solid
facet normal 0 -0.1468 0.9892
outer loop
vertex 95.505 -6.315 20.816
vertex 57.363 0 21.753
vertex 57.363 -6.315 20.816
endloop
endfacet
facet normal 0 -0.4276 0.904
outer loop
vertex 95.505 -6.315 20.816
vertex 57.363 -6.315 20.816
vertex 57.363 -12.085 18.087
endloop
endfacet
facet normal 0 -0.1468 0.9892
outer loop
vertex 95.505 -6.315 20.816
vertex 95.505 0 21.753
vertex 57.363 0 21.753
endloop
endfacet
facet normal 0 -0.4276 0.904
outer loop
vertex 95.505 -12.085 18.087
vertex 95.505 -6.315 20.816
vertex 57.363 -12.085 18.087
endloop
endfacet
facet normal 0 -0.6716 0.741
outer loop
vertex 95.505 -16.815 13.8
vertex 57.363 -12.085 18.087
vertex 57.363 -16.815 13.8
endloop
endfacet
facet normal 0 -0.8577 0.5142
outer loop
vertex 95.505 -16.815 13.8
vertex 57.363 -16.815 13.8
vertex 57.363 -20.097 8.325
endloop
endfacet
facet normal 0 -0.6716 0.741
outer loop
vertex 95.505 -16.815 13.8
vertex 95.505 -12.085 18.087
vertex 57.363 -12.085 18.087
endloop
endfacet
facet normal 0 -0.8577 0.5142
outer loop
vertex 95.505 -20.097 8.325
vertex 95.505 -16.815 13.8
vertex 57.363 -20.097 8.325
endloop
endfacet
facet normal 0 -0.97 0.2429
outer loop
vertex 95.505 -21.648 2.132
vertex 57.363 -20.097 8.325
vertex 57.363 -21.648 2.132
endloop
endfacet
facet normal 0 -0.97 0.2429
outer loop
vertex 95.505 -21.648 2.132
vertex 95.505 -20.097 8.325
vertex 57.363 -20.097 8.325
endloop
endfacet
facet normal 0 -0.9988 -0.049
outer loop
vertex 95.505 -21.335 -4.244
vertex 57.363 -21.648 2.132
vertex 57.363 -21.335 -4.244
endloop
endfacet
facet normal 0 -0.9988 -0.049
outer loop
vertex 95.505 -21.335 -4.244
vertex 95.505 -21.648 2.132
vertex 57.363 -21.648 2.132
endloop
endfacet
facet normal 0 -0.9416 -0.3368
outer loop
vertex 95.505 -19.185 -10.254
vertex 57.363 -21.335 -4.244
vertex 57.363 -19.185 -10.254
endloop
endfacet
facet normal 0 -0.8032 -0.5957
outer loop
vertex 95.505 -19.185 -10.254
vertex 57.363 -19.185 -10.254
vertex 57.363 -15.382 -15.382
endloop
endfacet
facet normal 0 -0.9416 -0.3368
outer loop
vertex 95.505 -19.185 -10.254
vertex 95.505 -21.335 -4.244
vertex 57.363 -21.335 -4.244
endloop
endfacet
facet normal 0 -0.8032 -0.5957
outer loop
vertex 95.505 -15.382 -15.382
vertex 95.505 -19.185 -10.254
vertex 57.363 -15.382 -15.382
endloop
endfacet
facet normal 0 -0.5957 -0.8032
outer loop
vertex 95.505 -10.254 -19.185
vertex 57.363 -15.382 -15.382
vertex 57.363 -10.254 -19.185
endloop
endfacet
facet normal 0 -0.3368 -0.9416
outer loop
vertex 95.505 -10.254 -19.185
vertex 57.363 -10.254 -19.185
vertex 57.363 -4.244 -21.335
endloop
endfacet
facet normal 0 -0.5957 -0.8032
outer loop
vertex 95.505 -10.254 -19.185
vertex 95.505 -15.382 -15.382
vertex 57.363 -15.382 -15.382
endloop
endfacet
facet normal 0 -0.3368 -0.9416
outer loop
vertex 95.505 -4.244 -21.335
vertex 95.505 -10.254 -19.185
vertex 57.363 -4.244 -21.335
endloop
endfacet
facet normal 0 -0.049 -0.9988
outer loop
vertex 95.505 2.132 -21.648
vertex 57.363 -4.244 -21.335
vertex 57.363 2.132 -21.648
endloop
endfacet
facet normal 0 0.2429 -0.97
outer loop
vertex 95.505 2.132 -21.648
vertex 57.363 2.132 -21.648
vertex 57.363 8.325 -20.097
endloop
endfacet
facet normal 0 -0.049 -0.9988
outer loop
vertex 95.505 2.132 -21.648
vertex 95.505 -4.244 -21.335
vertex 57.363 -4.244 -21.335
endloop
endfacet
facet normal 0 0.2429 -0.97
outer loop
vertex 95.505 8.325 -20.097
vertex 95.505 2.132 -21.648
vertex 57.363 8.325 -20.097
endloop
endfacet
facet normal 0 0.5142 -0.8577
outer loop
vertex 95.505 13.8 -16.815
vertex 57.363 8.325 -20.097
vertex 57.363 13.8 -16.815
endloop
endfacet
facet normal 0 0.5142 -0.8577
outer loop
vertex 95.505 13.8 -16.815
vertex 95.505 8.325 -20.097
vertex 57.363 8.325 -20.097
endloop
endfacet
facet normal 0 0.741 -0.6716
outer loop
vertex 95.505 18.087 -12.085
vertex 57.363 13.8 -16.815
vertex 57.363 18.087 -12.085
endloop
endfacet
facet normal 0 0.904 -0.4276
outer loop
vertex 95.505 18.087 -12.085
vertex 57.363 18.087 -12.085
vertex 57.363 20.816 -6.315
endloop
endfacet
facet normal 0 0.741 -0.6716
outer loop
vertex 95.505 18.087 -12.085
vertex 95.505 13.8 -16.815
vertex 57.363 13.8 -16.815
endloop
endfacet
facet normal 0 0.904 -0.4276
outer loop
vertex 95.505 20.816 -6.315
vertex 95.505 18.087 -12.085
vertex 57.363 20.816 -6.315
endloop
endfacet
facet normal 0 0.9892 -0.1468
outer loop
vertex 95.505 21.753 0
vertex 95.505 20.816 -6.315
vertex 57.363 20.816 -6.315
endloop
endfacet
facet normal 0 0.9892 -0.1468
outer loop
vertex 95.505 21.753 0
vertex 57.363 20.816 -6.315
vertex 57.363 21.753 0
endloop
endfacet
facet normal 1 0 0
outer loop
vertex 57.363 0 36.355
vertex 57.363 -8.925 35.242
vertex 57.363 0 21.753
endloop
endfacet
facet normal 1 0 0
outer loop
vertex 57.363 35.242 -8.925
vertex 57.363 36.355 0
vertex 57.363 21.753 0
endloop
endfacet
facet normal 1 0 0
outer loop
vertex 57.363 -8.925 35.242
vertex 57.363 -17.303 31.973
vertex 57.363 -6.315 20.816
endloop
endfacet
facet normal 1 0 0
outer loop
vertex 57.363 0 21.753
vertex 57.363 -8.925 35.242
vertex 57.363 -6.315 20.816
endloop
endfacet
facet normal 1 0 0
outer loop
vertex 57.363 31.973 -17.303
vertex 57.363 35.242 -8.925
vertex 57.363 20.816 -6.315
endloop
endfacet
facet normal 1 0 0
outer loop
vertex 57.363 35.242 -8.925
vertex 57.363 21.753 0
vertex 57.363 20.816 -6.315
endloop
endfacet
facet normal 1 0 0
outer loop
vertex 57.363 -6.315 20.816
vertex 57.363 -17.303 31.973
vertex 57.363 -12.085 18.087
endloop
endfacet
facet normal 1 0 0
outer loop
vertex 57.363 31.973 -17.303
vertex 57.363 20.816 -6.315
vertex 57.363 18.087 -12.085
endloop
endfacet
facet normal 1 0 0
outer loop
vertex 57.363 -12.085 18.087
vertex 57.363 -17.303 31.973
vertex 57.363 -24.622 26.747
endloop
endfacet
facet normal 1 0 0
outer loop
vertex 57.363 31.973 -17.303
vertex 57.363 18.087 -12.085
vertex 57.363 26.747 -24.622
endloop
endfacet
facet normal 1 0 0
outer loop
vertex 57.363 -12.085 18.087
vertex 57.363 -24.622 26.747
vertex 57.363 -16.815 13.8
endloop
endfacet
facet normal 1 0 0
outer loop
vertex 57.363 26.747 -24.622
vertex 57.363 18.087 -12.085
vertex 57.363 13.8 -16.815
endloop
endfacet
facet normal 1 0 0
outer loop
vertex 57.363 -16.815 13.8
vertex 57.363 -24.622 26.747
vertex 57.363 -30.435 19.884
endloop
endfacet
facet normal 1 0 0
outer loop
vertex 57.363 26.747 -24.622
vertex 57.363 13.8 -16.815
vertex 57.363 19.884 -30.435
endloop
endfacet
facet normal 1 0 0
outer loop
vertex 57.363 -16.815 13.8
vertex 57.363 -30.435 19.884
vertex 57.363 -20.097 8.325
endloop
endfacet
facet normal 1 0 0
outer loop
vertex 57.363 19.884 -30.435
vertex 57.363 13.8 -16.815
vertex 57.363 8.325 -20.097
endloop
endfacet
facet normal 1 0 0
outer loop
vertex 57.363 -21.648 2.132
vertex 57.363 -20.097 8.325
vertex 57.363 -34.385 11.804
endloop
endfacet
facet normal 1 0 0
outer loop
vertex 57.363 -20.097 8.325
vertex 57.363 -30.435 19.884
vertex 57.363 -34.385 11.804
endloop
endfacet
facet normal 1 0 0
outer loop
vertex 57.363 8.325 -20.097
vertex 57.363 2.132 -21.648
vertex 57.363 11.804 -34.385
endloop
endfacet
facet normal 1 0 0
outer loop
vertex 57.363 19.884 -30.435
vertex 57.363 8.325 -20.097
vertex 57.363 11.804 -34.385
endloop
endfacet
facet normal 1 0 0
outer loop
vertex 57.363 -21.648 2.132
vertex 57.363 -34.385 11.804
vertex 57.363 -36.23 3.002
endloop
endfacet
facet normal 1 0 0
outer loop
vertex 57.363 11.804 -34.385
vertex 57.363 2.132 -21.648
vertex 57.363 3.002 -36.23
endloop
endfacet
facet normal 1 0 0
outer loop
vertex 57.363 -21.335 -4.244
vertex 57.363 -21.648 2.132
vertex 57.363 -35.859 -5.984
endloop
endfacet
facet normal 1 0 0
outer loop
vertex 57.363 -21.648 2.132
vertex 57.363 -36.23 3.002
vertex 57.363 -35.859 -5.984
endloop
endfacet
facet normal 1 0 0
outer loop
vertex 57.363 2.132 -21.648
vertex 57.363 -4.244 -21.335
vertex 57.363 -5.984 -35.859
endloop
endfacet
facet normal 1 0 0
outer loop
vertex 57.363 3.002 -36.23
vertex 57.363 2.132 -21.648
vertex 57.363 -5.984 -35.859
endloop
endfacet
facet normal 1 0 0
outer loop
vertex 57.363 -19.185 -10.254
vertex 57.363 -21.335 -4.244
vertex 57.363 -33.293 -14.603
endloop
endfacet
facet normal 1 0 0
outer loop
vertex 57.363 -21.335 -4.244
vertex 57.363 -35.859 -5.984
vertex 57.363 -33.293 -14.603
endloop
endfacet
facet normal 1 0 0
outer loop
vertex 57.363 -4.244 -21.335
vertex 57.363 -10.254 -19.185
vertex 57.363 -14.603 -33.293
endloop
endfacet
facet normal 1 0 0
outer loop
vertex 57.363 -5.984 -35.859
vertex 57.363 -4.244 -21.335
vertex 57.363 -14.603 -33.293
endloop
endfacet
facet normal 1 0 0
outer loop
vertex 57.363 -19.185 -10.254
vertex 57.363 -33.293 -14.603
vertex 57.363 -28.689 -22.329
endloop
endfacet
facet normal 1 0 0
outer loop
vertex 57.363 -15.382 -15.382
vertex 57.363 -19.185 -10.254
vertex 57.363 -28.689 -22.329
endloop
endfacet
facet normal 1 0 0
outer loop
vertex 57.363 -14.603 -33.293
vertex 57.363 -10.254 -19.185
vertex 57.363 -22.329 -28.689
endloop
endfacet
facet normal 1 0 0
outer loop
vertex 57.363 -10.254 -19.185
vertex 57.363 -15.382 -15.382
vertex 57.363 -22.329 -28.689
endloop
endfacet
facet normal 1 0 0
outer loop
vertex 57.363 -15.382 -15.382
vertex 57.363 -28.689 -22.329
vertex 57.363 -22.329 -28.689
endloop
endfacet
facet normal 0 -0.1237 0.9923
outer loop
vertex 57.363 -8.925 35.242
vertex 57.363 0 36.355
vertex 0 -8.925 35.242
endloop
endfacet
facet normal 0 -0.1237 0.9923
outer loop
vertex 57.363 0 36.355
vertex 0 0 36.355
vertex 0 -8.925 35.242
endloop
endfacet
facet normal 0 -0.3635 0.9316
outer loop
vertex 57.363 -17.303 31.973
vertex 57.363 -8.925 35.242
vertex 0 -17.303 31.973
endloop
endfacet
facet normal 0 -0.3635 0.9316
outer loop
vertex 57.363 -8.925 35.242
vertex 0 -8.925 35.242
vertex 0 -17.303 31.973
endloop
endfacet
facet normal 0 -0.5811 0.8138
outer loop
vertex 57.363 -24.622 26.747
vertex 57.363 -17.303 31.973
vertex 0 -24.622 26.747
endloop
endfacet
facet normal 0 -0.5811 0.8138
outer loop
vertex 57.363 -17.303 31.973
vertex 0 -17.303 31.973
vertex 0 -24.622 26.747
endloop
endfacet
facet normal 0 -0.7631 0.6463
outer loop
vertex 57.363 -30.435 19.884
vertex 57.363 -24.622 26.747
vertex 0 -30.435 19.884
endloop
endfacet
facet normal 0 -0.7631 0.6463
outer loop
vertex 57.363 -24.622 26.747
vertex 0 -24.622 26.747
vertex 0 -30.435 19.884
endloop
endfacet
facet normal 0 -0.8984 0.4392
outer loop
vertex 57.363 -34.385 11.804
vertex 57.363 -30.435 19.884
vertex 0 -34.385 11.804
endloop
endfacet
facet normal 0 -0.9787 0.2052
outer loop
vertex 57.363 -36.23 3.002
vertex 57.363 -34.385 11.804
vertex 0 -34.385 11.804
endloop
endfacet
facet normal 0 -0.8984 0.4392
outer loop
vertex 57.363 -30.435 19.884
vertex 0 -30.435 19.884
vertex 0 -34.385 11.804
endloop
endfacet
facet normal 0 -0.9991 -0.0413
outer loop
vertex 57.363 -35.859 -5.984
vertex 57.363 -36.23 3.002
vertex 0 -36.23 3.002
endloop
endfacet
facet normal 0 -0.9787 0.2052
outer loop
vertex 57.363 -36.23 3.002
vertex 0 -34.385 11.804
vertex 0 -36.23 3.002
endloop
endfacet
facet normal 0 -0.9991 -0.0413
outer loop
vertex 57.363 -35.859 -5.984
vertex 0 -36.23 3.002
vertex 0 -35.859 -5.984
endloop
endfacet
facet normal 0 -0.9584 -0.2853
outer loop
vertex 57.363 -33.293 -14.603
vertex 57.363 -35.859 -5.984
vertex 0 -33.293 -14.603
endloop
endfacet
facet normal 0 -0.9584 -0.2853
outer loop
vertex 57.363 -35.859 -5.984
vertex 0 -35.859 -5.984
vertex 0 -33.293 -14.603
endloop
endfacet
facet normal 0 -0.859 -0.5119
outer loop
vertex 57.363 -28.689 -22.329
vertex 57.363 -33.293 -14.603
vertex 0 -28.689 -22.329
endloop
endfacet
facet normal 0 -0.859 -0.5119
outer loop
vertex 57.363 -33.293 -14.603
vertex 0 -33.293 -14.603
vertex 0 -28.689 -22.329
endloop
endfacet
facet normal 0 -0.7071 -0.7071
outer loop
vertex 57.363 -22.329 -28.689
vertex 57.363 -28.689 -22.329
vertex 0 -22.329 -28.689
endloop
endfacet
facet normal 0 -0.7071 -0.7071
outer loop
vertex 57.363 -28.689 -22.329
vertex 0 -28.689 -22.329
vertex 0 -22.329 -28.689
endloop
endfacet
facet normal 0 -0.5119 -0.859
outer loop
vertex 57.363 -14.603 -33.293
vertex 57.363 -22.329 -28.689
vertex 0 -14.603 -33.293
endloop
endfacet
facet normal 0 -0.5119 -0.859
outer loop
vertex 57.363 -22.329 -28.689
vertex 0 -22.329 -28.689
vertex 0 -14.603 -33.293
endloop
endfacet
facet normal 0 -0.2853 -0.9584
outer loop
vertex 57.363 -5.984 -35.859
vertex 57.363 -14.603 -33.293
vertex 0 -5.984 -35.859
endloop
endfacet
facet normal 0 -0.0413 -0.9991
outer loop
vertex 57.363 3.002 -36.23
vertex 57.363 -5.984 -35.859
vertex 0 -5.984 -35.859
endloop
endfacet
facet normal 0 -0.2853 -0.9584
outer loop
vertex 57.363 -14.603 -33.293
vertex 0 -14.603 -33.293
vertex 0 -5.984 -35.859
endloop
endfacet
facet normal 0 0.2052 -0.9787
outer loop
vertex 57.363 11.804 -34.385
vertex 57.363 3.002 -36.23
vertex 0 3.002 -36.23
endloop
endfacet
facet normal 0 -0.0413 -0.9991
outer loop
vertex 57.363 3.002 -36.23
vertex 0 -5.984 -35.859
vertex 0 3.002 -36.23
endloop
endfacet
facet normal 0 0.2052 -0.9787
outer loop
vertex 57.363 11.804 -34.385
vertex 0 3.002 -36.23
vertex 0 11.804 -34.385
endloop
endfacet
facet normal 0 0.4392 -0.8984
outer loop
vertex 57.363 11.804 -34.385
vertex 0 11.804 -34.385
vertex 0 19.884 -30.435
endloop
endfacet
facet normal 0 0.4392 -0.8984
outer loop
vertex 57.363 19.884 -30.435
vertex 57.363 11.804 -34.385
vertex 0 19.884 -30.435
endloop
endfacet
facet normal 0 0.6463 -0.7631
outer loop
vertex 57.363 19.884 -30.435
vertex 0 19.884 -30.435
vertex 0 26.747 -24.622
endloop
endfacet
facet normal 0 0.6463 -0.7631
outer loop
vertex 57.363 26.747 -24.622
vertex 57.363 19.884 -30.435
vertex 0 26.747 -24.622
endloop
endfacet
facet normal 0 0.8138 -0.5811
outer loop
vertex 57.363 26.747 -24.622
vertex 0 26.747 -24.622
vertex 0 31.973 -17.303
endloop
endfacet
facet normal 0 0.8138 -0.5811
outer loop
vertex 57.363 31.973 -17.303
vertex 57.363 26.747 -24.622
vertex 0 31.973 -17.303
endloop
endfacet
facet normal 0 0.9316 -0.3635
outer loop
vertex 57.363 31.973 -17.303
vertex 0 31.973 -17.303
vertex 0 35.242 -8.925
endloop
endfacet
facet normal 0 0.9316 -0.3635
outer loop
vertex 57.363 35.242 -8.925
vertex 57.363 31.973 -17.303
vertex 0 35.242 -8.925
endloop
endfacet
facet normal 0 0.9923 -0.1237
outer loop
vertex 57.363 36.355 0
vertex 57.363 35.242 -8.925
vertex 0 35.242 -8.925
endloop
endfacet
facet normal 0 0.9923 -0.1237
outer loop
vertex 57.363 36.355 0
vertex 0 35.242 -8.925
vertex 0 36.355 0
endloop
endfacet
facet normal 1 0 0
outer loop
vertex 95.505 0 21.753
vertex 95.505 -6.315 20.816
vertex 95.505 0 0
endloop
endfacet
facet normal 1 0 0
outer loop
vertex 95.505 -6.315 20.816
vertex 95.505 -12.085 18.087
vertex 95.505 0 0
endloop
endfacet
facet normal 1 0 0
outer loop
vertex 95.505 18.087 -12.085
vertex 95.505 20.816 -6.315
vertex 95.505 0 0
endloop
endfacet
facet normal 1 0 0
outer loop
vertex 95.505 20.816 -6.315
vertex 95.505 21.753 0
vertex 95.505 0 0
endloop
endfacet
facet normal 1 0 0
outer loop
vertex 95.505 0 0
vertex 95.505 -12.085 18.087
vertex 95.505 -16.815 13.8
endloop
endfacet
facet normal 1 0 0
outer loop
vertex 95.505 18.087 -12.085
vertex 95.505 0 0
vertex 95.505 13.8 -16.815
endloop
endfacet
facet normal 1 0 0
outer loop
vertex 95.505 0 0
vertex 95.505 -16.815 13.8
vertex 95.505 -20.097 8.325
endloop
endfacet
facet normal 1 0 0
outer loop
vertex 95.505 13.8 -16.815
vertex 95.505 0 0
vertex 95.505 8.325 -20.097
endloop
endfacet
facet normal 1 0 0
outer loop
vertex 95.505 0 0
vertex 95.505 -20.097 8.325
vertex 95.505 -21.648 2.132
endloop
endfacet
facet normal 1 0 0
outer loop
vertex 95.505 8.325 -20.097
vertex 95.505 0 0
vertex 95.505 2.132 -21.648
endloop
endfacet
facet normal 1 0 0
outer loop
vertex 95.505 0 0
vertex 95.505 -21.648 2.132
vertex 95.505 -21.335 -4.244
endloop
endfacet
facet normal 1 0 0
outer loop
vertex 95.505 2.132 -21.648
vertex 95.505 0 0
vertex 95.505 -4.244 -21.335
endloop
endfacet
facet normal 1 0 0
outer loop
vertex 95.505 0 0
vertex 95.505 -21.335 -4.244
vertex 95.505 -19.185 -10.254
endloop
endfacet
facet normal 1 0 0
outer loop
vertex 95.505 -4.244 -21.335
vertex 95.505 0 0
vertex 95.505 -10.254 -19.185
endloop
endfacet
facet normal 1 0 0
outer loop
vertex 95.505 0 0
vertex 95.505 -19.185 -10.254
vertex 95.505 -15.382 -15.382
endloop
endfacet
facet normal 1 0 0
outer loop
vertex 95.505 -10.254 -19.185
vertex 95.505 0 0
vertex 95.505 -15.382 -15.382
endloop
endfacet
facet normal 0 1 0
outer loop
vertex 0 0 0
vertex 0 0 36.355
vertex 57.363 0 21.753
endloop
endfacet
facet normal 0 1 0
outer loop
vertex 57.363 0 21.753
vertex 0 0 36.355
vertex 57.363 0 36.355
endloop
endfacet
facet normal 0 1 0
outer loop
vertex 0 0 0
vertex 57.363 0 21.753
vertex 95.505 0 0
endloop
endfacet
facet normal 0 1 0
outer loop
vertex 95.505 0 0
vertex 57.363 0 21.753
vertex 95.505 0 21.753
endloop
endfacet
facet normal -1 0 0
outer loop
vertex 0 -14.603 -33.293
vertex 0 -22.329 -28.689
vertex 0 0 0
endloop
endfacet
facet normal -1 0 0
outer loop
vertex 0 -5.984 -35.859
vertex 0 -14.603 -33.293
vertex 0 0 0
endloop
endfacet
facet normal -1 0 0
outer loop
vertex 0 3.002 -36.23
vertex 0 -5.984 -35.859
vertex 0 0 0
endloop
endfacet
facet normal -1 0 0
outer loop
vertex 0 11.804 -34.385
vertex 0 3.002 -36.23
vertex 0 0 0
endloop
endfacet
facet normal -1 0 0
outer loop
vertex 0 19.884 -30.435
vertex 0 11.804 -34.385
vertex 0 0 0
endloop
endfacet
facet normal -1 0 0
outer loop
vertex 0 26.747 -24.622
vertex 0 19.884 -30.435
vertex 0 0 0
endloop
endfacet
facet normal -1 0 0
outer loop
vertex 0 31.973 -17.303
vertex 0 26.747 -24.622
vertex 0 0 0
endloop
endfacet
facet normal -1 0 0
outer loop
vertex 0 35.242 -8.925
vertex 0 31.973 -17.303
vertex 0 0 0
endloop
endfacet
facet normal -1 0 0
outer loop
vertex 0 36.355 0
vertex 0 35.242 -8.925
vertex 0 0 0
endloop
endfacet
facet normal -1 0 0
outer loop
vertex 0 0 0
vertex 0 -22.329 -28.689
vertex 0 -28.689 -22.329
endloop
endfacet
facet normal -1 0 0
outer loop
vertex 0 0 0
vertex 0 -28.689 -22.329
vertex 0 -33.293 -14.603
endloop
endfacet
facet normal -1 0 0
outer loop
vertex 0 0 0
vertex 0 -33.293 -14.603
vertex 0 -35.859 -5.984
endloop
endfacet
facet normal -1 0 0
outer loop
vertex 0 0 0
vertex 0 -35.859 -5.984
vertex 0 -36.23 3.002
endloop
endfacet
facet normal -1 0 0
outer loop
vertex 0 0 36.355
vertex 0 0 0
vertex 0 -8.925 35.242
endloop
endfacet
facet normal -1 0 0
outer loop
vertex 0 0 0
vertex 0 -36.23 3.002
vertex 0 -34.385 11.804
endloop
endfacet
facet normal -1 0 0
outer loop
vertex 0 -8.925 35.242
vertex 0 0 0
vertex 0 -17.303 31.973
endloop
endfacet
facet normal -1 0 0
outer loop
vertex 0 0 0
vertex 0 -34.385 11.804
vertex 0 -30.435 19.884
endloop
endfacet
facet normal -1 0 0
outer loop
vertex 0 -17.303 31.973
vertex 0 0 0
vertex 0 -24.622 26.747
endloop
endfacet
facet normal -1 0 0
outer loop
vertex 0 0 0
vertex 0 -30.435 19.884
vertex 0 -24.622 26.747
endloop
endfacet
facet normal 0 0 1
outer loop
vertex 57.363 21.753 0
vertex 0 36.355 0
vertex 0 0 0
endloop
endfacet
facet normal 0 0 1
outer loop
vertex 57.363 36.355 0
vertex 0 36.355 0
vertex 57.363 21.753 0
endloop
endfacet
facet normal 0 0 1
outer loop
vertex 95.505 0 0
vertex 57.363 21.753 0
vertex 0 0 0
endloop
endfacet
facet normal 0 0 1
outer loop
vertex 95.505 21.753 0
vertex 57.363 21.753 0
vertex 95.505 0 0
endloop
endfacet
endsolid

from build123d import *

# Parameters (mm, degrees)
F0_W     = 38.1425693631
F0_H     = 21.7531826347
F1_ANGLE = 270


with BuildPart() as f1:
    # F0 (on Front) → F1 (revolve)
    with BuildSketch(Plane.XZ):
        Polygon((0, 36.3546386361), (0, 0), (57.3628470302, 0), (57.3628470302, 21.7531826347), (57.3628470302, 36.3546386361), align=None)
        with Locations((76.4341317117, 10.8765913174)):
            Rectangle(F0_W, F0_H)
    revolve(axis=Axis((28.6814235151, 0, 0), (1, 0, 0)), revolution_arc=F1_ANGLE)


solid = f1.part
